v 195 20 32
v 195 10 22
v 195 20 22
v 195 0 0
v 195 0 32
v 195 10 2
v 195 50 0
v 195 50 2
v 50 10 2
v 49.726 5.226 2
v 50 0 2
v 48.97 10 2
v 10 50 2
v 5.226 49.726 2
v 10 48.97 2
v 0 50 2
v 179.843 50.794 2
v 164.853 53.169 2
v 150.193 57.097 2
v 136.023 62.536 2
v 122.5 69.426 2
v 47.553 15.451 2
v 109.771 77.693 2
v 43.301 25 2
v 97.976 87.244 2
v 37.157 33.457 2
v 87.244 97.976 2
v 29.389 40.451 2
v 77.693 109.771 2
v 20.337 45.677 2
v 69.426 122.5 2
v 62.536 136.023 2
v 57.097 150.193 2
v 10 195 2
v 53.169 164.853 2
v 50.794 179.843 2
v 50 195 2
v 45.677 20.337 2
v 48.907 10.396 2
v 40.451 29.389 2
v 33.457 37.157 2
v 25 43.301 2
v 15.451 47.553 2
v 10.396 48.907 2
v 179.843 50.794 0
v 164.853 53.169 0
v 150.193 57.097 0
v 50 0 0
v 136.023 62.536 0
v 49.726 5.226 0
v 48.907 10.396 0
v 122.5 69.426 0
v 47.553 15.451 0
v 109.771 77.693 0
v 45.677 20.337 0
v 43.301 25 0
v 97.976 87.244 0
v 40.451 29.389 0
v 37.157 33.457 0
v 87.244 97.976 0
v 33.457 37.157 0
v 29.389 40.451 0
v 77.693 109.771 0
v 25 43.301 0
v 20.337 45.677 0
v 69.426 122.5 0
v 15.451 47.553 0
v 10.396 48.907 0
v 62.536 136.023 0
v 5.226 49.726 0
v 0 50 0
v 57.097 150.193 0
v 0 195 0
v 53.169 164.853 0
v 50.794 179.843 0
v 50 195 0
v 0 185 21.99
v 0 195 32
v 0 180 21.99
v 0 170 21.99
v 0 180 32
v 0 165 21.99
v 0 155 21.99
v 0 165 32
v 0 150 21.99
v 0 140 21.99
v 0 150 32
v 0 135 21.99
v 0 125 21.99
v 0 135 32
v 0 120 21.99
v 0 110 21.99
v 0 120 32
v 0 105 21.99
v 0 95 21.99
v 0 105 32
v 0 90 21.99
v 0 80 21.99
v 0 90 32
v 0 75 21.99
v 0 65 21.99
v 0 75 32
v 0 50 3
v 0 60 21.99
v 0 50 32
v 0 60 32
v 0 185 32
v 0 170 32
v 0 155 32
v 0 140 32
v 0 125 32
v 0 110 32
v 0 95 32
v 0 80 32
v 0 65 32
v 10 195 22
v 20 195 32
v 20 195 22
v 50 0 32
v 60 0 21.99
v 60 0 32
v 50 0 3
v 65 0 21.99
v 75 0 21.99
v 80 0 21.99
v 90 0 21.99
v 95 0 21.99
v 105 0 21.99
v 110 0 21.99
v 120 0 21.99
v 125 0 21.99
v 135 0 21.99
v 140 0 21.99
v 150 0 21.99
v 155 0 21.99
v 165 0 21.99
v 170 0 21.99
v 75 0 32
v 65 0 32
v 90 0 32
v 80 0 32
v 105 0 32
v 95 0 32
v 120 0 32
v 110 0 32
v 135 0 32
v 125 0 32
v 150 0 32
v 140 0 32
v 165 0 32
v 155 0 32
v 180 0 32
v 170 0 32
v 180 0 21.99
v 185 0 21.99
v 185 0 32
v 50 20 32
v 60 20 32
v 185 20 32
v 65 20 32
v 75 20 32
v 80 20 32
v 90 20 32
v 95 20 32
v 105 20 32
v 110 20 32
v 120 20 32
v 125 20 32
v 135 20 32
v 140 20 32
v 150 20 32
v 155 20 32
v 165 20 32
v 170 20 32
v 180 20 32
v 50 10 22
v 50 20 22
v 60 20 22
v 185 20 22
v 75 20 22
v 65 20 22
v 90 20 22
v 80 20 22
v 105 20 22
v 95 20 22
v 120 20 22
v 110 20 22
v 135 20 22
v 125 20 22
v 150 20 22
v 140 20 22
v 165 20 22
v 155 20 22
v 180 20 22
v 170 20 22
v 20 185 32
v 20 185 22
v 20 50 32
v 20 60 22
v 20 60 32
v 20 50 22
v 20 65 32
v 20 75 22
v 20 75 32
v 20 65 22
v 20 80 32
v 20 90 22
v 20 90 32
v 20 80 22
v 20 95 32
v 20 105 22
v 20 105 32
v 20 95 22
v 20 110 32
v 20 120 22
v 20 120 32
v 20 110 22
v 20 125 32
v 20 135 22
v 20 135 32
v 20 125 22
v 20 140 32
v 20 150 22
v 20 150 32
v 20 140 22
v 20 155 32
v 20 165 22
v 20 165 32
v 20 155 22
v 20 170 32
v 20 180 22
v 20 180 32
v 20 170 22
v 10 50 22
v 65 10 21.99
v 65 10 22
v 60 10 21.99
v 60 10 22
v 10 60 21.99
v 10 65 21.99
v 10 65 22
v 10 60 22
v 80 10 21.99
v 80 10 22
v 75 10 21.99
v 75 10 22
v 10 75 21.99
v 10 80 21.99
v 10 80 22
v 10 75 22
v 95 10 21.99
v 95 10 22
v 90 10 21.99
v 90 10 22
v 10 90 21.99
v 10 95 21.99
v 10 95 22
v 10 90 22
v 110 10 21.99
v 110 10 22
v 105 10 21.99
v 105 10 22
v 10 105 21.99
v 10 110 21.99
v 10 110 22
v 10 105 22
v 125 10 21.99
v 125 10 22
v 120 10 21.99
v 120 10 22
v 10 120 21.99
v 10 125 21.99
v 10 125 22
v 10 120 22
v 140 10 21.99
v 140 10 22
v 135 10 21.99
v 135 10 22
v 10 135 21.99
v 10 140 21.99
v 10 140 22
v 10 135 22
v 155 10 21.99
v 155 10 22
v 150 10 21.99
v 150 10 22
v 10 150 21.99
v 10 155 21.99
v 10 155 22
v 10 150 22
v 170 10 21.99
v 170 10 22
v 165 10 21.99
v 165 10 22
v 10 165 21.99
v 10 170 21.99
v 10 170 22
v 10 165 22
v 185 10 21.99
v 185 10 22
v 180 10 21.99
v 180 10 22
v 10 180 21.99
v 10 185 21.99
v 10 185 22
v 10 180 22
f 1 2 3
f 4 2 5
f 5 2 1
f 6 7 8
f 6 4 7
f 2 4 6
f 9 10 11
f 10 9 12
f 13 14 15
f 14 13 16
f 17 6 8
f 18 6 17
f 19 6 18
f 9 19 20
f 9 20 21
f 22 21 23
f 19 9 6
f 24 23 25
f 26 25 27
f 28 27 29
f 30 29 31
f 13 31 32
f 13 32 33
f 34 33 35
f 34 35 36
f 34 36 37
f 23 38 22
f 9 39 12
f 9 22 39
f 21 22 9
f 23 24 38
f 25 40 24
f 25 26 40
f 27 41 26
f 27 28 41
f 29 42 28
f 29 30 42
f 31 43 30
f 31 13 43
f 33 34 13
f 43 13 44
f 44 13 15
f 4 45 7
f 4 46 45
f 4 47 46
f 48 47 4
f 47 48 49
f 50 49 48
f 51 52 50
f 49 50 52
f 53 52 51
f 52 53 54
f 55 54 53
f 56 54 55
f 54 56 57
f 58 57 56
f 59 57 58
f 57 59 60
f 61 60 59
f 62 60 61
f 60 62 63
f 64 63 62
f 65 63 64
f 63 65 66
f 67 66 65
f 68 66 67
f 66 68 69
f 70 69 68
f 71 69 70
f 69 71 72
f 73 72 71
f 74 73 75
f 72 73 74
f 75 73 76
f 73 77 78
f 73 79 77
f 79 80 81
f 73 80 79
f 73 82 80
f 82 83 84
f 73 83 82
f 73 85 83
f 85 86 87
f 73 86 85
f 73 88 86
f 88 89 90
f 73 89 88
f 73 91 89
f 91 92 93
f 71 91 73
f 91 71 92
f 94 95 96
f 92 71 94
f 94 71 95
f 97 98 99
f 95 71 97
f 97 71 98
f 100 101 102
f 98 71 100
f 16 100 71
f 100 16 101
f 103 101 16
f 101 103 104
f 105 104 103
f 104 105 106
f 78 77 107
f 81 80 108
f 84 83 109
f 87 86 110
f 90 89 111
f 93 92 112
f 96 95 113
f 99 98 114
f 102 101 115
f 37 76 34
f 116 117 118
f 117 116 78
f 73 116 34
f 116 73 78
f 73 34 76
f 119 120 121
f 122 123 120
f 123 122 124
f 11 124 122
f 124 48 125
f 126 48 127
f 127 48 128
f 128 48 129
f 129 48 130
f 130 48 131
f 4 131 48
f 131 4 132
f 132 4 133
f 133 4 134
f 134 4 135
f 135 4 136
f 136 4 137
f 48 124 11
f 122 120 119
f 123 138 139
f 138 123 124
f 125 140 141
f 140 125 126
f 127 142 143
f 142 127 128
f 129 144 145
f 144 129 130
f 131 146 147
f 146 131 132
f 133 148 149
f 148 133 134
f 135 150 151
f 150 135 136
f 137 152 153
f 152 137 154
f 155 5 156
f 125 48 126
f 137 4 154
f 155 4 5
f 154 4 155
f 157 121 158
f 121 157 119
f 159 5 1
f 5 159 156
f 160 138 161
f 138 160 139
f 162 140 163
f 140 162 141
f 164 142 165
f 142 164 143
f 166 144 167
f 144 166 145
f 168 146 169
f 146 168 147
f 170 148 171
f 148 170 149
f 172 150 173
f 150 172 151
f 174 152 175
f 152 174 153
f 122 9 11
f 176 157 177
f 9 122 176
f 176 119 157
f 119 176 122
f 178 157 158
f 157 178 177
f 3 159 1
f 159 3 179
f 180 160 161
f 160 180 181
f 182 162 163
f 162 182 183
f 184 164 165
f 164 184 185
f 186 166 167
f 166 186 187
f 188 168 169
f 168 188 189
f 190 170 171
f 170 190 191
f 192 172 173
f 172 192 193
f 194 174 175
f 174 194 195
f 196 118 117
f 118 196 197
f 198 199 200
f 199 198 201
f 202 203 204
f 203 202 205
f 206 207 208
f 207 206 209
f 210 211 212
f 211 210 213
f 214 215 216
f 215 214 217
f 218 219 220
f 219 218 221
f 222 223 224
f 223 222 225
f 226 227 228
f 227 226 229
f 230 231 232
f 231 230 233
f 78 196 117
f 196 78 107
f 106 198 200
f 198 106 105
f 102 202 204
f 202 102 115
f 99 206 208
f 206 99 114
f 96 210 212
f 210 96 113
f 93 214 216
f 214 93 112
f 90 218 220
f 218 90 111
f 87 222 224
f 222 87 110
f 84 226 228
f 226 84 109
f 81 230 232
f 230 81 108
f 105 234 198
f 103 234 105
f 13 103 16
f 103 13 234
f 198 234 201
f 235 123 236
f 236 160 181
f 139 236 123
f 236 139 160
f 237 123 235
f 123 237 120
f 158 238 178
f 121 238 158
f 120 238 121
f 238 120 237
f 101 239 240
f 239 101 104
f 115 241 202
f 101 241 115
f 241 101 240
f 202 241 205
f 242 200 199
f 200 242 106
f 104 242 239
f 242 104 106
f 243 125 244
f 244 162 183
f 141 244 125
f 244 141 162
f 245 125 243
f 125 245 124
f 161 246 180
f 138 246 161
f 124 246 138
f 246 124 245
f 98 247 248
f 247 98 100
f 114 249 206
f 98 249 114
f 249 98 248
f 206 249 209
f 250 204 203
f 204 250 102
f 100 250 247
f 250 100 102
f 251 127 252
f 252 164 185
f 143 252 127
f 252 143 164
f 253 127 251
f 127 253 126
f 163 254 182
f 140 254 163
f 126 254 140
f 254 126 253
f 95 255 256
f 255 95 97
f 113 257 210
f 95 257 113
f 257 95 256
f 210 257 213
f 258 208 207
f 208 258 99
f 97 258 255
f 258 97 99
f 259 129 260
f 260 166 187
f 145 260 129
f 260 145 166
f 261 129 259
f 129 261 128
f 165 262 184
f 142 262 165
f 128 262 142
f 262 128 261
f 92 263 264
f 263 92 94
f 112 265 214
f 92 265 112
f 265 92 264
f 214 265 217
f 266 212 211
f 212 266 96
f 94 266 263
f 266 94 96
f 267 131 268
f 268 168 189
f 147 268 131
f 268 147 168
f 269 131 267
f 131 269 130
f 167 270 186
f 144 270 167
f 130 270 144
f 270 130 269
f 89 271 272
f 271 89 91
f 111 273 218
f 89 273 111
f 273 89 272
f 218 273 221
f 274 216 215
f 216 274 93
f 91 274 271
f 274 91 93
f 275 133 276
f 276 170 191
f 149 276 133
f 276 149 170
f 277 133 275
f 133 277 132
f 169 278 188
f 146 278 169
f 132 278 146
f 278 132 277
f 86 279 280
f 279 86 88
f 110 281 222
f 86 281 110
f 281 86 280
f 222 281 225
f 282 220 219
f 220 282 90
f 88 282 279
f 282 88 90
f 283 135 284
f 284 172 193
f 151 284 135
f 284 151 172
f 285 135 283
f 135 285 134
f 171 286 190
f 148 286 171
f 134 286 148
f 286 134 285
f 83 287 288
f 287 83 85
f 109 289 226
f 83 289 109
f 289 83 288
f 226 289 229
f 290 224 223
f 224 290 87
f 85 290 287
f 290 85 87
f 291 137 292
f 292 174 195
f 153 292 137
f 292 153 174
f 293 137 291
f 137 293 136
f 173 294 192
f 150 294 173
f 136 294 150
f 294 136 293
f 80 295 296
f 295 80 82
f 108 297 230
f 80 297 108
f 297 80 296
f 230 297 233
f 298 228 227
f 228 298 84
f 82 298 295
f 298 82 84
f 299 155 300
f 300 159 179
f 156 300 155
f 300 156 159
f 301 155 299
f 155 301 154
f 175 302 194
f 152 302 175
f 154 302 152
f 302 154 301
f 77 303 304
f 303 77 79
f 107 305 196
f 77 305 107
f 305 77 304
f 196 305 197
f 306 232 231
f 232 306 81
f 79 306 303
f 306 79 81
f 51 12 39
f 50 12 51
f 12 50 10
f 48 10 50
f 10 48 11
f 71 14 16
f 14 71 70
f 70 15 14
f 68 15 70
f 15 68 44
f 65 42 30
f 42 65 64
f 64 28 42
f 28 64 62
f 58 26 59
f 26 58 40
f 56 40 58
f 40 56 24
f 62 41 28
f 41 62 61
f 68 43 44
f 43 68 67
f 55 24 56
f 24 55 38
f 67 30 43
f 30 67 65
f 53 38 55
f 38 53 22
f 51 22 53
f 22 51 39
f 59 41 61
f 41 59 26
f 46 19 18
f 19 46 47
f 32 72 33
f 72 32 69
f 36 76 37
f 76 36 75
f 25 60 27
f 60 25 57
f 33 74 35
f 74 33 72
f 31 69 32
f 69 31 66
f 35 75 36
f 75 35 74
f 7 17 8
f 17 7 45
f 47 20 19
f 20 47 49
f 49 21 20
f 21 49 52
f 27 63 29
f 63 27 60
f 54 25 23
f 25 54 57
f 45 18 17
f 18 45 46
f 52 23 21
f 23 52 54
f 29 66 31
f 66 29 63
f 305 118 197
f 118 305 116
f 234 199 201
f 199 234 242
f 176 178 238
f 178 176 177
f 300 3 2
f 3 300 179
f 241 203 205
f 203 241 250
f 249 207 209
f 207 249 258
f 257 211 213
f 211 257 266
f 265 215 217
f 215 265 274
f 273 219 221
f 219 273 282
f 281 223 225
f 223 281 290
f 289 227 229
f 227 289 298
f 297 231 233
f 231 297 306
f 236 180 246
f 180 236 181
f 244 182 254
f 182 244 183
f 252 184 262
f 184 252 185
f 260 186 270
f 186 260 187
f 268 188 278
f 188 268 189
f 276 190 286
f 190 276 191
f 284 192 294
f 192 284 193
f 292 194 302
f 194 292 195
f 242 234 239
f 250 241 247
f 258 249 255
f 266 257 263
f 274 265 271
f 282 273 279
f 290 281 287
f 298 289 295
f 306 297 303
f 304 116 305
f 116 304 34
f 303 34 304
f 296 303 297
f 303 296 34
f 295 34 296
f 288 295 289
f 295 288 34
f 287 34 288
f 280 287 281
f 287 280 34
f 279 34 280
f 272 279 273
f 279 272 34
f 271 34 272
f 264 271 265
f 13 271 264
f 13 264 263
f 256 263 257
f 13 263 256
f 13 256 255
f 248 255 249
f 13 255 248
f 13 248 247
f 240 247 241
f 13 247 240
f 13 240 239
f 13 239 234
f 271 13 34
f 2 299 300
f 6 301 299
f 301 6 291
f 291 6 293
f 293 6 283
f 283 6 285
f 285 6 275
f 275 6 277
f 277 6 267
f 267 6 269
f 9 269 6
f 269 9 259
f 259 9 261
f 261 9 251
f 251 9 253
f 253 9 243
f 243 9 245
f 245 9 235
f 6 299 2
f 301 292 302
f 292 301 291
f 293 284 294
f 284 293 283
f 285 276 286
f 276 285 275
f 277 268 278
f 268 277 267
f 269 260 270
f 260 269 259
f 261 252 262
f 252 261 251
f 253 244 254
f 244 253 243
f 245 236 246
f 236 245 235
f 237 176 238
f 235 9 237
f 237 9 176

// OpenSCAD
bt=20;  // board thickness
at=2;   // arc thickness

co=50;  // corner offset

th=10;  // tooth height
tt=10;  // tooth thickness
dt=5;   // distance between teeth
nt=10;  // number of teeth

w=nt*tt+(nt-1)*dt; // width row of teeth
echo(Row_of_teeth = w);

difference()
{
    union()
    {
        cube([w+co,w+co,at]);
        
        color("Blue")
        translate([co,0,at-0.01])
        cube([w,bt,bt+th+0.01]);

        color("Purple")
        translate([0,co,at-0.01])
        cube([bt,w,bt+th+0.01]);
    };

    color("Green")
    translate([0,0,at/2])
    cylinder(h=2*at,r=co,center=true, $fn=60);

    color("Red")
    translate([w+co,w+co,at/2])
    cylinder(h=2*at,r=w,center=true, $fn=60);
    
    color("Orange")
    translate([bt/2,bt/2,at])
    cube([w+co,w+co,bt]);
    
    color("Fuchsia")
    for(n=[1:nt-1])
    {
        translate([co-dt+n*(tt+dt),-0.5,at+bt-0.01])
        cube([dt,bt+1,th+1]);
        
        translate([-0.5,co-dt+n*(tt+dt),at+bt-0.01])
        cube([bt+1,dt,th+1]);
    };
};
